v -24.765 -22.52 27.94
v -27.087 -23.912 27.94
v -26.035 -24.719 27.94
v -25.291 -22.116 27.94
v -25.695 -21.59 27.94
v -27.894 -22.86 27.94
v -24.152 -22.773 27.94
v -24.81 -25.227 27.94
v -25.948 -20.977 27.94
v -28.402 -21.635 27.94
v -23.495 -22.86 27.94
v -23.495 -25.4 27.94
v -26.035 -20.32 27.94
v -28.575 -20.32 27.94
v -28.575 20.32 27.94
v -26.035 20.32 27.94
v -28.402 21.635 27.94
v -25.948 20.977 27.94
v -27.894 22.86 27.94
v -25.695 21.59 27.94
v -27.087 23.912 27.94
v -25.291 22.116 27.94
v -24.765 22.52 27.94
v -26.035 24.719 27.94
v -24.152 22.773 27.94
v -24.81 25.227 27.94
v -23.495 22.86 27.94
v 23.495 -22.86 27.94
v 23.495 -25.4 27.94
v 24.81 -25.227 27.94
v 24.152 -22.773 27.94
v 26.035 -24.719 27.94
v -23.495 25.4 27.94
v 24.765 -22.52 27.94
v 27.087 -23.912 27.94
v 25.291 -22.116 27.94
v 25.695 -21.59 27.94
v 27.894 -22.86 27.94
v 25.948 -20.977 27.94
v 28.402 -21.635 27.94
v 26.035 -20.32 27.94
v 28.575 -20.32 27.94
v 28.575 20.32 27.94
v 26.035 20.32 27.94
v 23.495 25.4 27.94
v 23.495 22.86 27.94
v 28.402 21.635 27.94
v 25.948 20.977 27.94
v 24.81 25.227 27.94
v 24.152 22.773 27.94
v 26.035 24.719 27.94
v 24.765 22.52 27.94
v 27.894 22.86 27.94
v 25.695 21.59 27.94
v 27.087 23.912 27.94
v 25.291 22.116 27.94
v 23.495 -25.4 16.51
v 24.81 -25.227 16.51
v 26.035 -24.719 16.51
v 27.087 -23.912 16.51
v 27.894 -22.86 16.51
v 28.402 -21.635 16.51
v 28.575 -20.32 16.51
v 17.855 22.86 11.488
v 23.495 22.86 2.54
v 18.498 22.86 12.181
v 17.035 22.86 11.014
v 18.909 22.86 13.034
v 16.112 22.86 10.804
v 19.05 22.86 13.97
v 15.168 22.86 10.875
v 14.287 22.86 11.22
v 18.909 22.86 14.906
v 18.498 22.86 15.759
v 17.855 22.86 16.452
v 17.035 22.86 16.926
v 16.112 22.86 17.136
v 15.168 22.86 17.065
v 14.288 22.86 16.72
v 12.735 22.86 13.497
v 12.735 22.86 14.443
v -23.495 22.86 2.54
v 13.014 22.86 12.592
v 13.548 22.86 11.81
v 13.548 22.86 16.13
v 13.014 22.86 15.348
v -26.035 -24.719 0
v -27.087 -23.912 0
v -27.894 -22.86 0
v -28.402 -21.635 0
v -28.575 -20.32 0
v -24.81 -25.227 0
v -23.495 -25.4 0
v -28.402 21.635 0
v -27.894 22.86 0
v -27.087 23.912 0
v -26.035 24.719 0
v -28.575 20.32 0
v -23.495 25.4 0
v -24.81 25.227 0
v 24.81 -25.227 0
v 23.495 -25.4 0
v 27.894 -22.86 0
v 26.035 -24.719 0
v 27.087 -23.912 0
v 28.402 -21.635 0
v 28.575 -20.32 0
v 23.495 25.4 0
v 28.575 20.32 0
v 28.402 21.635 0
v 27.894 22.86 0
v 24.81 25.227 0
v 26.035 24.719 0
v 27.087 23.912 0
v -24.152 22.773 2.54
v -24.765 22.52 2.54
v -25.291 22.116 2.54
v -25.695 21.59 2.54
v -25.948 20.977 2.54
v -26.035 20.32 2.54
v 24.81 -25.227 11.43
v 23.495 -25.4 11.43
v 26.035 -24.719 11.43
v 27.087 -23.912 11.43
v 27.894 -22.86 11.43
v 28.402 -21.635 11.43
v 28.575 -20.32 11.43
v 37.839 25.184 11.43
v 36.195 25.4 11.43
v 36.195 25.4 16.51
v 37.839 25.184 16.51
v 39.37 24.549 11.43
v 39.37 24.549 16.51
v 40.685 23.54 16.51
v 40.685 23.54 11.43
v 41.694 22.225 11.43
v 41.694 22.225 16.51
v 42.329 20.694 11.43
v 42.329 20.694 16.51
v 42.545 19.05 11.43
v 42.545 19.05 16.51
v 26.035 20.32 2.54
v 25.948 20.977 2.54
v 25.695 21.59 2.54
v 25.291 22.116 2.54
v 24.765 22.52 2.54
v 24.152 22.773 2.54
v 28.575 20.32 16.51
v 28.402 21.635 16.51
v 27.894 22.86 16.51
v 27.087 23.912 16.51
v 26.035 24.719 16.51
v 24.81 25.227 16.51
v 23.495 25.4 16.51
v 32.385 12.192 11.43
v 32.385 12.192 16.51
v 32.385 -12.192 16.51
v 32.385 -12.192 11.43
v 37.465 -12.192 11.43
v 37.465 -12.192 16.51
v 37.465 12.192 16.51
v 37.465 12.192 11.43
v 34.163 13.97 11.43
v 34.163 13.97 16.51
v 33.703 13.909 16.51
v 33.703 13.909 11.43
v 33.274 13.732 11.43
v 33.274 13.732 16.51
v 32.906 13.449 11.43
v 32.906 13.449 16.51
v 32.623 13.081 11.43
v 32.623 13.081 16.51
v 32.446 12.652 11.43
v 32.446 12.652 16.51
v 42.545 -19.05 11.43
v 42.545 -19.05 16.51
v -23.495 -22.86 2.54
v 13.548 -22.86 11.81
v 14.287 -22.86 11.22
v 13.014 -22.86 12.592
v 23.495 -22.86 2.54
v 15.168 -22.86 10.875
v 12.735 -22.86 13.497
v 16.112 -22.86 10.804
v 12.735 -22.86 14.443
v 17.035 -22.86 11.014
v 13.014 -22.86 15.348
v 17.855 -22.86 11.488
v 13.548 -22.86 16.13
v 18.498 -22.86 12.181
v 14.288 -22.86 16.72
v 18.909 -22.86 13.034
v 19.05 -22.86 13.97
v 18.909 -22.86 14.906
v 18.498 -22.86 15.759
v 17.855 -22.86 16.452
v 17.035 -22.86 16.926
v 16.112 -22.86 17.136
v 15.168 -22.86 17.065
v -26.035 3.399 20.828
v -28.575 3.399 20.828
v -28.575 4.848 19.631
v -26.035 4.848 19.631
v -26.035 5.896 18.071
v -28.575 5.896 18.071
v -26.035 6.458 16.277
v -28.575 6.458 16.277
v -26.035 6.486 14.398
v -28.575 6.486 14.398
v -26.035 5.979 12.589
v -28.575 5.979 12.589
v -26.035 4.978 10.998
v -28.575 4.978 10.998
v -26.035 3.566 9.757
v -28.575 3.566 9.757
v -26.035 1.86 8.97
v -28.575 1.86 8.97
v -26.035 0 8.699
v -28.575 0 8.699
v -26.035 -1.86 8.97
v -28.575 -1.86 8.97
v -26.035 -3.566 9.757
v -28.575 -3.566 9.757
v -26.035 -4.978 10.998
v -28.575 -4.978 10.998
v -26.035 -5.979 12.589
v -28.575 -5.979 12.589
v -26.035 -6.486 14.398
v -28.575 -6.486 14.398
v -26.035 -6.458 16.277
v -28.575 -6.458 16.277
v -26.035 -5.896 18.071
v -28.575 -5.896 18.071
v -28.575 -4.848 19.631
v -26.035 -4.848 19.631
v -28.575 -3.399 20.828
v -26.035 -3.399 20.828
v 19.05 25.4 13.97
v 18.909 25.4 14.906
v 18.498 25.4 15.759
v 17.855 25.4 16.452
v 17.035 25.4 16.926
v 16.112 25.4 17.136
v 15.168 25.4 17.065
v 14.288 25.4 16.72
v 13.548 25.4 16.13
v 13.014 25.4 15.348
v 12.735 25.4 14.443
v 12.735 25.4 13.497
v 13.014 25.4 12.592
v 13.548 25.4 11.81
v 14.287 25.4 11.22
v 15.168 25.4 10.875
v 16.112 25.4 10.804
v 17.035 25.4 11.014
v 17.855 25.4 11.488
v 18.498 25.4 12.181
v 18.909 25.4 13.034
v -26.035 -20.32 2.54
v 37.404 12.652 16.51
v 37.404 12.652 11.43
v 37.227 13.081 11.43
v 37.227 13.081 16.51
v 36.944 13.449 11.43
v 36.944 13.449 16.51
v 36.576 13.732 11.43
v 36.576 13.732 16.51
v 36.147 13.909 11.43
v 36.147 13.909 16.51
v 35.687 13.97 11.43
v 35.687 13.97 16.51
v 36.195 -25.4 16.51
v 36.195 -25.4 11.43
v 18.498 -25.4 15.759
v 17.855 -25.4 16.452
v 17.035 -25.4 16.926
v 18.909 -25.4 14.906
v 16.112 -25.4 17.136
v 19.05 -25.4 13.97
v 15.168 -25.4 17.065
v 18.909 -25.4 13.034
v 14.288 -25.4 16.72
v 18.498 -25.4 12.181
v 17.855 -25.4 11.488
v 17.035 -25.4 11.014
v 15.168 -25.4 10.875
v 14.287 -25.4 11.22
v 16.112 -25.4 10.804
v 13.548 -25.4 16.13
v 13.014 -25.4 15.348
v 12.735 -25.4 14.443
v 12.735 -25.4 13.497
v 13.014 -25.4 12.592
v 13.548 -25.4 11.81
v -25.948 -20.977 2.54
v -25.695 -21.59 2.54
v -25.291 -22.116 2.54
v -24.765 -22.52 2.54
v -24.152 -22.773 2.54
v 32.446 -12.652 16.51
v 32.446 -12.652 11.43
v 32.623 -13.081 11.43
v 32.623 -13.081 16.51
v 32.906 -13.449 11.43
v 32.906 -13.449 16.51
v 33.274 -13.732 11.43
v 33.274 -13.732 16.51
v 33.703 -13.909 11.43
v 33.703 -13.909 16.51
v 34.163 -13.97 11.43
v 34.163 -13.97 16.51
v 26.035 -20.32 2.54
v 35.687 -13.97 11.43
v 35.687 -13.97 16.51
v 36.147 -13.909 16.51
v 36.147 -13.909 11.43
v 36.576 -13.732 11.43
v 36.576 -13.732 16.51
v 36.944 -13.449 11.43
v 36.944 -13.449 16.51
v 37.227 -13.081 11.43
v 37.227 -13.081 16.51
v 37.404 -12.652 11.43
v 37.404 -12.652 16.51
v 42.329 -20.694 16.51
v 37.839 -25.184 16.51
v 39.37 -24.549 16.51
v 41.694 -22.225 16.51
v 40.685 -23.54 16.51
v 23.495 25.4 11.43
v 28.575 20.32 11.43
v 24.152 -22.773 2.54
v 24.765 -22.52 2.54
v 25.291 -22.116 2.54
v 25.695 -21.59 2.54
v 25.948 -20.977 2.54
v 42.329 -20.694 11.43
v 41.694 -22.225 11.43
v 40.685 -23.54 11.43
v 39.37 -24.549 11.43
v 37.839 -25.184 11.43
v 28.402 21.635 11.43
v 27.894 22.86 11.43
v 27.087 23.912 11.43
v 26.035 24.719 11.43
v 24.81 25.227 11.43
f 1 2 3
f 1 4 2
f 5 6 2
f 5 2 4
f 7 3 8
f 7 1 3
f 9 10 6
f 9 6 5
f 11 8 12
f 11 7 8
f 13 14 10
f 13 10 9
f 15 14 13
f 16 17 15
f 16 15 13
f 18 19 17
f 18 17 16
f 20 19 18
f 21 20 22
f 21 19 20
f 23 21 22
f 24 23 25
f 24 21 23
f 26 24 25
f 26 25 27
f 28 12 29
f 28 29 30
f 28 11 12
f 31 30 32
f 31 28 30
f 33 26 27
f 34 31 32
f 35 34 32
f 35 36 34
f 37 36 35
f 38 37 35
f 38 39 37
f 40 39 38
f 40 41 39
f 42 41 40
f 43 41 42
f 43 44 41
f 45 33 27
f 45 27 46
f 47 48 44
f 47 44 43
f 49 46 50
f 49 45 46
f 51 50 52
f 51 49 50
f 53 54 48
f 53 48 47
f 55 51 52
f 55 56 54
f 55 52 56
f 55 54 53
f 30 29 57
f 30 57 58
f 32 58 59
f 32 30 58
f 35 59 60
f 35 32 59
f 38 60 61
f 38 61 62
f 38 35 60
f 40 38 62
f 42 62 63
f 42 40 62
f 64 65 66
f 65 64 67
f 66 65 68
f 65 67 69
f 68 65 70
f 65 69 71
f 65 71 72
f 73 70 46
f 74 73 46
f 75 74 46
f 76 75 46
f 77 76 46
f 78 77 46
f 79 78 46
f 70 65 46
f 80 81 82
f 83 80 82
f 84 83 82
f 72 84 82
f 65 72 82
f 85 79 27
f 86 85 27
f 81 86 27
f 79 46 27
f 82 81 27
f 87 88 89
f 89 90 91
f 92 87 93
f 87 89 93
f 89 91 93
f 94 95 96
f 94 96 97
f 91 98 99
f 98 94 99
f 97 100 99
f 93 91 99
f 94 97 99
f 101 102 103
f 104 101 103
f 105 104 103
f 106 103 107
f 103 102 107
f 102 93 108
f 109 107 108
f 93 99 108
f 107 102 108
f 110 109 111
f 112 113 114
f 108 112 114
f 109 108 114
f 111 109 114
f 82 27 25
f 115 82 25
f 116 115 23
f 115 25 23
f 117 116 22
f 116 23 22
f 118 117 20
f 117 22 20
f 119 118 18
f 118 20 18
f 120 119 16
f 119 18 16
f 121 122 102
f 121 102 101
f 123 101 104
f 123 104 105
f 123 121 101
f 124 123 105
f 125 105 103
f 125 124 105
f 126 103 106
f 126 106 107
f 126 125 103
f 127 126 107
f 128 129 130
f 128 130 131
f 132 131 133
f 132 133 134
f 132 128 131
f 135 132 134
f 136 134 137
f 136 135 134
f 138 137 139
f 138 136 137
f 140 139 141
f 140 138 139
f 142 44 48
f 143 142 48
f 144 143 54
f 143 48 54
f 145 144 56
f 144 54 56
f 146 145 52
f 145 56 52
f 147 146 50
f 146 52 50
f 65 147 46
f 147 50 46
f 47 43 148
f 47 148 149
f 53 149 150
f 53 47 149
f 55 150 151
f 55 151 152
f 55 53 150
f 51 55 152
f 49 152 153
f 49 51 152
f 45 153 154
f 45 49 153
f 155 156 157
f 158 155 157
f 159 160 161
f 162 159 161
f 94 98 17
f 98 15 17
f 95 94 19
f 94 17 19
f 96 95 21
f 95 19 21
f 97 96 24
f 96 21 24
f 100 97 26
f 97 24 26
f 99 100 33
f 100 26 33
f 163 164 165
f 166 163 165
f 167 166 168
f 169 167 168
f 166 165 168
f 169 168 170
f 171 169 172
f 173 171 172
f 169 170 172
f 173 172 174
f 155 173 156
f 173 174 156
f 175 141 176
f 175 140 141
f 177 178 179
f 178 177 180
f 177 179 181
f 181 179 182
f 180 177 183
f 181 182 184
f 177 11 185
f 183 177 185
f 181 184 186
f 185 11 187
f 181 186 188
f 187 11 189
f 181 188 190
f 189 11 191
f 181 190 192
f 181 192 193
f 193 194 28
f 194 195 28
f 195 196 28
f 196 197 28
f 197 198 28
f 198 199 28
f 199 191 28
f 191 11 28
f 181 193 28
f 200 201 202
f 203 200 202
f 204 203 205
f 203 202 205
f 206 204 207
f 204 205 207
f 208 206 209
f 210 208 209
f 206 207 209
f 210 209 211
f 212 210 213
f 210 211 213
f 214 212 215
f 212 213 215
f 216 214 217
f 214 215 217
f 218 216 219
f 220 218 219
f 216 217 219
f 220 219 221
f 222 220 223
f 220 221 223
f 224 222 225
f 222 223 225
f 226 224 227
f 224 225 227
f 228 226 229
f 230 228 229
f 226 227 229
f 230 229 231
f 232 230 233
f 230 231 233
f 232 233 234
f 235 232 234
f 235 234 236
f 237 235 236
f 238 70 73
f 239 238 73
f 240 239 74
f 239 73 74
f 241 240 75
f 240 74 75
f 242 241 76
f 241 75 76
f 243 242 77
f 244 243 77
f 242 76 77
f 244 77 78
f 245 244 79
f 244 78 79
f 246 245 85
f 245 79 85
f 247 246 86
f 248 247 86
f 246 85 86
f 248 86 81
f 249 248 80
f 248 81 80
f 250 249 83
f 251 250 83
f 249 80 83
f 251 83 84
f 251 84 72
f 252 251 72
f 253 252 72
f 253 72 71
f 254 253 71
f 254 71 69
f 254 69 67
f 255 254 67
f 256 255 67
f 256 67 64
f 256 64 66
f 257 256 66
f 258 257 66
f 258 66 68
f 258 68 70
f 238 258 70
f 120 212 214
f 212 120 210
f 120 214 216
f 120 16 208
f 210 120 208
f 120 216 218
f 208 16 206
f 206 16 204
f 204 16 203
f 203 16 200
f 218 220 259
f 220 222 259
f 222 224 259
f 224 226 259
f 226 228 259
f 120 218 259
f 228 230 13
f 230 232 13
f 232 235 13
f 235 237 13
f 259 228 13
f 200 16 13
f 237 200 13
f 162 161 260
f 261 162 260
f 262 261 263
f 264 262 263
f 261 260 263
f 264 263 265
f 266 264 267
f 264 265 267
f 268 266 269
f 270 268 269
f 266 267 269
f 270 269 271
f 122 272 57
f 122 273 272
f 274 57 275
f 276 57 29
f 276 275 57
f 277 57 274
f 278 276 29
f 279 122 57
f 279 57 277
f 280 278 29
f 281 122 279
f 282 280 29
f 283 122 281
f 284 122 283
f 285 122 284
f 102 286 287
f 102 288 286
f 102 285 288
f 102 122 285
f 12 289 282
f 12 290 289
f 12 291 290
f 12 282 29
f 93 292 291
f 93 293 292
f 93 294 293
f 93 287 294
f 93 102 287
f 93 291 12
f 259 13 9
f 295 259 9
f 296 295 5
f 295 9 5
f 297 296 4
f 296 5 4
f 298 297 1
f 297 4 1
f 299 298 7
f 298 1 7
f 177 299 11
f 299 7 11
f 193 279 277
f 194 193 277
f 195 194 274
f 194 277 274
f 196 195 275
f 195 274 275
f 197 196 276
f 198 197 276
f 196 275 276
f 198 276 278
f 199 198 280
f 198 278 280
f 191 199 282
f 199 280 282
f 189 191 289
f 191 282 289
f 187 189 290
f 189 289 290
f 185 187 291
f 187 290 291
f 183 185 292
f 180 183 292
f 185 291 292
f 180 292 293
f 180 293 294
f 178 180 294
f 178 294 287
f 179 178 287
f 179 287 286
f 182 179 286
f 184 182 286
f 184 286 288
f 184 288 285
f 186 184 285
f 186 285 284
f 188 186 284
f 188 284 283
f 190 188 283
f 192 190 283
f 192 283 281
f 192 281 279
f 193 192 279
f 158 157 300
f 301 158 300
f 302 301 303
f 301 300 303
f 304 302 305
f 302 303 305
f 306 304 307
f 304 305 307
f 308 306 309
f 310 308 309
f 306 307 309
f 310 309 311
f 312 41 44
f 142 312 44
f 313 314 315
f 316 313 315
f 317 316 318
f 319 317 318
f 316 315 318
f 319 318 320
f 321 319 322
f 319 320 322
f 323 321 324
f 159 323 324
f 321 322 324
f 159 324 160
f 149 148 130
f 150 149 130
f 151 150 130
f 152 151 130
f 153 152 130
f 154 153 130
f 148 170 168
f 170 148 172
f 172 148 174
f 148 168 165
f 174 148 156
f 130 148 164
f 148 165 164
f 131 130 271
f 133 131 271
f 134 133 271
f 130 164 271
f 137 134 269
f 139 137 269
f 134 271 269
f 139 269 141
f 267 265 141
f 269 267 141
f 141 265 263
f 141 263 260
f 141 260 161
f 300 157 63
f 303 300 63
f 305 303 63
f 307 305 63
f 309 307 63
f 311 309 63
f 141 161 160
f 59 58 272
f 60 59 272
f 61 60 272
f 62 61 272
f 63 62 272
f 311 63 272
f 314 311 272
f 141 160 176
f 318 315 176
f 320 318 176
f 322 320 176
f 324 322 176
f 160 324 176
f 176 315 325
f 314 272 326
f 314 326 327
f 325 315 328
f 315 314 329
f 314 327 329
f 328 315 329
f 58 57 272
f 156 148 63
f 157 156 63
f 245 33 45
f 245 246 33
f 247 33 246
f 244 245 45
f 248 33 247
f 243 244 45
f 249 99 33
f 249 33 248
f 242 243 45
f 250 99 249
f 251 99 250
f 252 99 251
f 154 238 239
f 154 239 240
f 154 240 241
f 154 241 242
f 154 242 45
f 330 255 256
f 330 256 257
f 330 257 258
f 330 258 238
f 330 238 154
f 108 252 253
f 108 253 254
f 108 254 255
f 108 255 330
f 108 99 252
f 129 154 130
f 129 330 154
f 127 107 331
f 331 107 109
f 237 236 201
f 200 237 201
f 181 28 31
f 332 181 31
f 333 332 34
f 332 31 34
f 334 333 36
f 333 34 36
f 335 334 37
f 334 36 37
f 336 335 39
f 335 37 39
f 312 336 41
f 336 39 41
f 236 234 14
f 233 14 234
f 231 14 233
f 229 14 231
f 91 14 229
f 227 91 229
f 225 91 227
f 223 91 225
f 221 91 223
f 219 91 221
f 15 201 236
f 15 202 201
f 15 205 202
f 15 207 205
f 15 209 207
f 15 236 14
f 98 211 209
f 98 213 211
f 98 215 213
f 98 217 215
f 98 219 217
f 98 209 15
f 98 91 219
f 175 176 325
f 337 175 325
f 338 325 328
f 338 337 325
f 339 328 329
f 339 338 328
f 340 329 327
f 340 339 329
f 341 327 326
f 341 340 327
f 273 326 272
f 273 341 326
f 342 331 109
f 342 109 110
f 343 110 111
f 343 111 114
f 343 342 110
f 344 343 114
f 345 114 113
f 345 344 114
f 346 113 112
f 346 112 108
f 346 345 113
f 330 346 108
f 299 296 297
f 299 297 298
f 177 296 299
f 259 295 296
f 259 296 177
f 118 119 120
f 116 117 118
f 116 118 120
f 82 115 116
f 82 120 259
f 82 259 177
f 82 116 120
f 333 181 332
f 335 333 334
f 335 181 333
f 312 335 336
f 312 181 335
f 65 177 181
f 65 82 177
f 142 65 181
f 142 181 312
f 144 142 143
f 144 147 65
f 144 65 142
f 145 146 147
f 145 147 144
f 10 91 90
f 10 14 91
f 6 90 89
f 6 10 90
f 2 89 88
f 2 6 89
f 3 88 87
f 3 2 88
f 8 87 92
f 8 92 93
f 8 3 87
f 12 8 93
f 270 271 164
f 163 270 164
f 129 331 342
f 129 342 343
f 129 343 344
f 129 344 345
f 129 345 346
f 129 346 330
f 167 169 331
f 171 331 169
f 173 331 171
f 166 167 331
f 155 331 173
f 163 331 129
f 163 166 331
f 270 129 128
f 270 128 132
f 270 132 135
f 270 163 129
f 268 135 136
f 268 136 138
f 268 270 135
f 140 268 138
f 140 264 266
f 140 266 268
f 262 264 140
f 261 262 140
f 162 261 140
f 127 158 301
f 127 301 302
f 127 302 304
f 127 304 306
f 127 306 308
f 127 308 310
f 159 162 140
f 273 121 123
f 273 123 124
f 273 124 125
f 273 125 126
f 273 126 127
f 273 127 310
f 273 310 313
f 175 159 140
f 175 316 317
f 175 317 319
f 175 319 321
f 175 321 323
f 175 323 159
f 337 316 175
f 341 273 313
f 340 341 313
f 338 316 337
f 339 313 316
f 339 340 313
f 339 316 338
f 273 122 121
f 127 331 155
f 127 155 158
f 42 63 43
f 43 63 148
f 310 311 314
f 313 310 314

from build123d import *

# Parameters (mm, degrees)
F0_W      = 57.15
F0_H      = 50.8
F1_DEPTH  = 27.94
F2_R      = 5.08
F5_DEPTH  = 2.54
F7_DEPTH  = 25.4
F9_DEPTH  = 2.54
F10_R     = 3.175
F11_DEPTH = 50.801
F13_DEPTH = 5.08


with BuildPart() as f1:
    # F0 (on Top) → F1 (new body)
    with BuildSketch(Plane.XY):
        Rectangle(F0_W, F0_H)
    extrude(amount=F1_DEPTH)

    # F2
    f2_edges = [f1.edges().sort_by_distance(p)[0] for p in [
        (-28.575, 25.4, 13.97),
        (28.575, 25.4, 13.97),
        (28.575, -25.4, 13.97),
        (-28.575, -25.4, 13.97),
    ]]
    fillet(f2_edges, radius=F2_R)

    # F4 (on offset) → F5 (join, symmetric)
    with BuildSketch(Plane(origin=(0, 0, 13.97), x_dir=(1, 0, 0), z_dir=(0, 0, -1))):
        with BuildLine():
            Line((36.195, 25.4), (23.495, 25.4))
            Line((23.495, 25.4), (23.495, -25.4))
            Line((23.495, -25.4), (36.195, -25.4))
            ThreePointArc((36.195, -25.4), (40.685128, -23.540128), (42.545, -19.05))
            Line((42.545, -19.05), (42.545, 19.05))
            ThreePointArc((42.545, 19.05), (40.685128, 23.540128), (36.195, 25.4))
        make_face()
    extrude(amount=F5_DEPTH, both=True)

    # F6 (on face) → F7 (cut)
    with BuildSketch(Plane.XY.offset(27.94)):
        with BuildLine():
            ThreePointArc((-26.035, -20.32), (-25.291051, -22.116051), (-23.495, -22.86))
            Line((-23.495, -22.86), (23.495, -22.86))
            ThreePointArc((23.495, -22.86), (25.291051, -22.116051), (26.035, -20.32))
            Line((26.035, -20.32), (26.035, 20.32))
            ThreePointArc((26.035, 20.32), (25.291051, 22.116051), (23.495, 22.86))
            Line((23.495, 22.86), (-23.495, 22.86))
            ThreePointArc((-23.495, 22.86), (-25.291051, 22.116051), (-26.035, 20.32))
            Line((-26.035, 20.32), (-26.035, -20.32))
        make_face()
    extrude(amount=-F7_DEPTH, mode=Mode.SUBTRACT)

    # F8 (on face) → F9 (cut, through all)
    with BuildSketch(Plane(origin=(-28.575, 0, 0), x_dir=(0, -1, 0), z_dir=(-1, 0, 0))):
        with BuildLine():
            Line((3.398882, 20.828), (-3.398882, 20.828))
            ThreePointArc((-3.398882, 20.828), (0, 8.6995), (3.398882, 20.828))
        make_face()
    extrude(amount=-F9_DEPTH, mode=Mode.SUBTRACT)

    # F10 (on face) → F11 (cut, through all)
    with BuildSketch(Plane.XZ.offset(25.4)):
        with Locations((15.875, 13.97)):
            Circle(F10_R)
    extrude(amount=-F11_DEPTH, mode=Mode.SUBTRACT)

    # F12 (on face) → F13 (cut, through all)
    with BuildSketch(Plane.XY.offset(16.51)):
        with BuildLine():
            Line((35.687, 13.97), (34.163, 13.97))
            ThreePointArc((34.163, 13.97), (32.905764, 13.449236), (32.385, 12.192))
            Line((32.385, 12.192), (32.385, -12.192))
            ThreePointArc((32.385, -12.192), (32.905764, -13.449236), (34.163, -13.97))
            Line((34.163, -13.97), (35.687, -13.97))
            ThreePointArc((35.687, -13.97), (36.944236, -13.449236), (37.465, -12.192))
            Line((37.465, -12.192), (37.465, 12.192))
            ThreePointArc((37.465, 12.192), (36.944236, 13.449236), (35.687, 13.97))
        make_face()
    extrude(amount=-F13_DEPTH, mode=Mode.SUBTRACT)


solid = f1.part
